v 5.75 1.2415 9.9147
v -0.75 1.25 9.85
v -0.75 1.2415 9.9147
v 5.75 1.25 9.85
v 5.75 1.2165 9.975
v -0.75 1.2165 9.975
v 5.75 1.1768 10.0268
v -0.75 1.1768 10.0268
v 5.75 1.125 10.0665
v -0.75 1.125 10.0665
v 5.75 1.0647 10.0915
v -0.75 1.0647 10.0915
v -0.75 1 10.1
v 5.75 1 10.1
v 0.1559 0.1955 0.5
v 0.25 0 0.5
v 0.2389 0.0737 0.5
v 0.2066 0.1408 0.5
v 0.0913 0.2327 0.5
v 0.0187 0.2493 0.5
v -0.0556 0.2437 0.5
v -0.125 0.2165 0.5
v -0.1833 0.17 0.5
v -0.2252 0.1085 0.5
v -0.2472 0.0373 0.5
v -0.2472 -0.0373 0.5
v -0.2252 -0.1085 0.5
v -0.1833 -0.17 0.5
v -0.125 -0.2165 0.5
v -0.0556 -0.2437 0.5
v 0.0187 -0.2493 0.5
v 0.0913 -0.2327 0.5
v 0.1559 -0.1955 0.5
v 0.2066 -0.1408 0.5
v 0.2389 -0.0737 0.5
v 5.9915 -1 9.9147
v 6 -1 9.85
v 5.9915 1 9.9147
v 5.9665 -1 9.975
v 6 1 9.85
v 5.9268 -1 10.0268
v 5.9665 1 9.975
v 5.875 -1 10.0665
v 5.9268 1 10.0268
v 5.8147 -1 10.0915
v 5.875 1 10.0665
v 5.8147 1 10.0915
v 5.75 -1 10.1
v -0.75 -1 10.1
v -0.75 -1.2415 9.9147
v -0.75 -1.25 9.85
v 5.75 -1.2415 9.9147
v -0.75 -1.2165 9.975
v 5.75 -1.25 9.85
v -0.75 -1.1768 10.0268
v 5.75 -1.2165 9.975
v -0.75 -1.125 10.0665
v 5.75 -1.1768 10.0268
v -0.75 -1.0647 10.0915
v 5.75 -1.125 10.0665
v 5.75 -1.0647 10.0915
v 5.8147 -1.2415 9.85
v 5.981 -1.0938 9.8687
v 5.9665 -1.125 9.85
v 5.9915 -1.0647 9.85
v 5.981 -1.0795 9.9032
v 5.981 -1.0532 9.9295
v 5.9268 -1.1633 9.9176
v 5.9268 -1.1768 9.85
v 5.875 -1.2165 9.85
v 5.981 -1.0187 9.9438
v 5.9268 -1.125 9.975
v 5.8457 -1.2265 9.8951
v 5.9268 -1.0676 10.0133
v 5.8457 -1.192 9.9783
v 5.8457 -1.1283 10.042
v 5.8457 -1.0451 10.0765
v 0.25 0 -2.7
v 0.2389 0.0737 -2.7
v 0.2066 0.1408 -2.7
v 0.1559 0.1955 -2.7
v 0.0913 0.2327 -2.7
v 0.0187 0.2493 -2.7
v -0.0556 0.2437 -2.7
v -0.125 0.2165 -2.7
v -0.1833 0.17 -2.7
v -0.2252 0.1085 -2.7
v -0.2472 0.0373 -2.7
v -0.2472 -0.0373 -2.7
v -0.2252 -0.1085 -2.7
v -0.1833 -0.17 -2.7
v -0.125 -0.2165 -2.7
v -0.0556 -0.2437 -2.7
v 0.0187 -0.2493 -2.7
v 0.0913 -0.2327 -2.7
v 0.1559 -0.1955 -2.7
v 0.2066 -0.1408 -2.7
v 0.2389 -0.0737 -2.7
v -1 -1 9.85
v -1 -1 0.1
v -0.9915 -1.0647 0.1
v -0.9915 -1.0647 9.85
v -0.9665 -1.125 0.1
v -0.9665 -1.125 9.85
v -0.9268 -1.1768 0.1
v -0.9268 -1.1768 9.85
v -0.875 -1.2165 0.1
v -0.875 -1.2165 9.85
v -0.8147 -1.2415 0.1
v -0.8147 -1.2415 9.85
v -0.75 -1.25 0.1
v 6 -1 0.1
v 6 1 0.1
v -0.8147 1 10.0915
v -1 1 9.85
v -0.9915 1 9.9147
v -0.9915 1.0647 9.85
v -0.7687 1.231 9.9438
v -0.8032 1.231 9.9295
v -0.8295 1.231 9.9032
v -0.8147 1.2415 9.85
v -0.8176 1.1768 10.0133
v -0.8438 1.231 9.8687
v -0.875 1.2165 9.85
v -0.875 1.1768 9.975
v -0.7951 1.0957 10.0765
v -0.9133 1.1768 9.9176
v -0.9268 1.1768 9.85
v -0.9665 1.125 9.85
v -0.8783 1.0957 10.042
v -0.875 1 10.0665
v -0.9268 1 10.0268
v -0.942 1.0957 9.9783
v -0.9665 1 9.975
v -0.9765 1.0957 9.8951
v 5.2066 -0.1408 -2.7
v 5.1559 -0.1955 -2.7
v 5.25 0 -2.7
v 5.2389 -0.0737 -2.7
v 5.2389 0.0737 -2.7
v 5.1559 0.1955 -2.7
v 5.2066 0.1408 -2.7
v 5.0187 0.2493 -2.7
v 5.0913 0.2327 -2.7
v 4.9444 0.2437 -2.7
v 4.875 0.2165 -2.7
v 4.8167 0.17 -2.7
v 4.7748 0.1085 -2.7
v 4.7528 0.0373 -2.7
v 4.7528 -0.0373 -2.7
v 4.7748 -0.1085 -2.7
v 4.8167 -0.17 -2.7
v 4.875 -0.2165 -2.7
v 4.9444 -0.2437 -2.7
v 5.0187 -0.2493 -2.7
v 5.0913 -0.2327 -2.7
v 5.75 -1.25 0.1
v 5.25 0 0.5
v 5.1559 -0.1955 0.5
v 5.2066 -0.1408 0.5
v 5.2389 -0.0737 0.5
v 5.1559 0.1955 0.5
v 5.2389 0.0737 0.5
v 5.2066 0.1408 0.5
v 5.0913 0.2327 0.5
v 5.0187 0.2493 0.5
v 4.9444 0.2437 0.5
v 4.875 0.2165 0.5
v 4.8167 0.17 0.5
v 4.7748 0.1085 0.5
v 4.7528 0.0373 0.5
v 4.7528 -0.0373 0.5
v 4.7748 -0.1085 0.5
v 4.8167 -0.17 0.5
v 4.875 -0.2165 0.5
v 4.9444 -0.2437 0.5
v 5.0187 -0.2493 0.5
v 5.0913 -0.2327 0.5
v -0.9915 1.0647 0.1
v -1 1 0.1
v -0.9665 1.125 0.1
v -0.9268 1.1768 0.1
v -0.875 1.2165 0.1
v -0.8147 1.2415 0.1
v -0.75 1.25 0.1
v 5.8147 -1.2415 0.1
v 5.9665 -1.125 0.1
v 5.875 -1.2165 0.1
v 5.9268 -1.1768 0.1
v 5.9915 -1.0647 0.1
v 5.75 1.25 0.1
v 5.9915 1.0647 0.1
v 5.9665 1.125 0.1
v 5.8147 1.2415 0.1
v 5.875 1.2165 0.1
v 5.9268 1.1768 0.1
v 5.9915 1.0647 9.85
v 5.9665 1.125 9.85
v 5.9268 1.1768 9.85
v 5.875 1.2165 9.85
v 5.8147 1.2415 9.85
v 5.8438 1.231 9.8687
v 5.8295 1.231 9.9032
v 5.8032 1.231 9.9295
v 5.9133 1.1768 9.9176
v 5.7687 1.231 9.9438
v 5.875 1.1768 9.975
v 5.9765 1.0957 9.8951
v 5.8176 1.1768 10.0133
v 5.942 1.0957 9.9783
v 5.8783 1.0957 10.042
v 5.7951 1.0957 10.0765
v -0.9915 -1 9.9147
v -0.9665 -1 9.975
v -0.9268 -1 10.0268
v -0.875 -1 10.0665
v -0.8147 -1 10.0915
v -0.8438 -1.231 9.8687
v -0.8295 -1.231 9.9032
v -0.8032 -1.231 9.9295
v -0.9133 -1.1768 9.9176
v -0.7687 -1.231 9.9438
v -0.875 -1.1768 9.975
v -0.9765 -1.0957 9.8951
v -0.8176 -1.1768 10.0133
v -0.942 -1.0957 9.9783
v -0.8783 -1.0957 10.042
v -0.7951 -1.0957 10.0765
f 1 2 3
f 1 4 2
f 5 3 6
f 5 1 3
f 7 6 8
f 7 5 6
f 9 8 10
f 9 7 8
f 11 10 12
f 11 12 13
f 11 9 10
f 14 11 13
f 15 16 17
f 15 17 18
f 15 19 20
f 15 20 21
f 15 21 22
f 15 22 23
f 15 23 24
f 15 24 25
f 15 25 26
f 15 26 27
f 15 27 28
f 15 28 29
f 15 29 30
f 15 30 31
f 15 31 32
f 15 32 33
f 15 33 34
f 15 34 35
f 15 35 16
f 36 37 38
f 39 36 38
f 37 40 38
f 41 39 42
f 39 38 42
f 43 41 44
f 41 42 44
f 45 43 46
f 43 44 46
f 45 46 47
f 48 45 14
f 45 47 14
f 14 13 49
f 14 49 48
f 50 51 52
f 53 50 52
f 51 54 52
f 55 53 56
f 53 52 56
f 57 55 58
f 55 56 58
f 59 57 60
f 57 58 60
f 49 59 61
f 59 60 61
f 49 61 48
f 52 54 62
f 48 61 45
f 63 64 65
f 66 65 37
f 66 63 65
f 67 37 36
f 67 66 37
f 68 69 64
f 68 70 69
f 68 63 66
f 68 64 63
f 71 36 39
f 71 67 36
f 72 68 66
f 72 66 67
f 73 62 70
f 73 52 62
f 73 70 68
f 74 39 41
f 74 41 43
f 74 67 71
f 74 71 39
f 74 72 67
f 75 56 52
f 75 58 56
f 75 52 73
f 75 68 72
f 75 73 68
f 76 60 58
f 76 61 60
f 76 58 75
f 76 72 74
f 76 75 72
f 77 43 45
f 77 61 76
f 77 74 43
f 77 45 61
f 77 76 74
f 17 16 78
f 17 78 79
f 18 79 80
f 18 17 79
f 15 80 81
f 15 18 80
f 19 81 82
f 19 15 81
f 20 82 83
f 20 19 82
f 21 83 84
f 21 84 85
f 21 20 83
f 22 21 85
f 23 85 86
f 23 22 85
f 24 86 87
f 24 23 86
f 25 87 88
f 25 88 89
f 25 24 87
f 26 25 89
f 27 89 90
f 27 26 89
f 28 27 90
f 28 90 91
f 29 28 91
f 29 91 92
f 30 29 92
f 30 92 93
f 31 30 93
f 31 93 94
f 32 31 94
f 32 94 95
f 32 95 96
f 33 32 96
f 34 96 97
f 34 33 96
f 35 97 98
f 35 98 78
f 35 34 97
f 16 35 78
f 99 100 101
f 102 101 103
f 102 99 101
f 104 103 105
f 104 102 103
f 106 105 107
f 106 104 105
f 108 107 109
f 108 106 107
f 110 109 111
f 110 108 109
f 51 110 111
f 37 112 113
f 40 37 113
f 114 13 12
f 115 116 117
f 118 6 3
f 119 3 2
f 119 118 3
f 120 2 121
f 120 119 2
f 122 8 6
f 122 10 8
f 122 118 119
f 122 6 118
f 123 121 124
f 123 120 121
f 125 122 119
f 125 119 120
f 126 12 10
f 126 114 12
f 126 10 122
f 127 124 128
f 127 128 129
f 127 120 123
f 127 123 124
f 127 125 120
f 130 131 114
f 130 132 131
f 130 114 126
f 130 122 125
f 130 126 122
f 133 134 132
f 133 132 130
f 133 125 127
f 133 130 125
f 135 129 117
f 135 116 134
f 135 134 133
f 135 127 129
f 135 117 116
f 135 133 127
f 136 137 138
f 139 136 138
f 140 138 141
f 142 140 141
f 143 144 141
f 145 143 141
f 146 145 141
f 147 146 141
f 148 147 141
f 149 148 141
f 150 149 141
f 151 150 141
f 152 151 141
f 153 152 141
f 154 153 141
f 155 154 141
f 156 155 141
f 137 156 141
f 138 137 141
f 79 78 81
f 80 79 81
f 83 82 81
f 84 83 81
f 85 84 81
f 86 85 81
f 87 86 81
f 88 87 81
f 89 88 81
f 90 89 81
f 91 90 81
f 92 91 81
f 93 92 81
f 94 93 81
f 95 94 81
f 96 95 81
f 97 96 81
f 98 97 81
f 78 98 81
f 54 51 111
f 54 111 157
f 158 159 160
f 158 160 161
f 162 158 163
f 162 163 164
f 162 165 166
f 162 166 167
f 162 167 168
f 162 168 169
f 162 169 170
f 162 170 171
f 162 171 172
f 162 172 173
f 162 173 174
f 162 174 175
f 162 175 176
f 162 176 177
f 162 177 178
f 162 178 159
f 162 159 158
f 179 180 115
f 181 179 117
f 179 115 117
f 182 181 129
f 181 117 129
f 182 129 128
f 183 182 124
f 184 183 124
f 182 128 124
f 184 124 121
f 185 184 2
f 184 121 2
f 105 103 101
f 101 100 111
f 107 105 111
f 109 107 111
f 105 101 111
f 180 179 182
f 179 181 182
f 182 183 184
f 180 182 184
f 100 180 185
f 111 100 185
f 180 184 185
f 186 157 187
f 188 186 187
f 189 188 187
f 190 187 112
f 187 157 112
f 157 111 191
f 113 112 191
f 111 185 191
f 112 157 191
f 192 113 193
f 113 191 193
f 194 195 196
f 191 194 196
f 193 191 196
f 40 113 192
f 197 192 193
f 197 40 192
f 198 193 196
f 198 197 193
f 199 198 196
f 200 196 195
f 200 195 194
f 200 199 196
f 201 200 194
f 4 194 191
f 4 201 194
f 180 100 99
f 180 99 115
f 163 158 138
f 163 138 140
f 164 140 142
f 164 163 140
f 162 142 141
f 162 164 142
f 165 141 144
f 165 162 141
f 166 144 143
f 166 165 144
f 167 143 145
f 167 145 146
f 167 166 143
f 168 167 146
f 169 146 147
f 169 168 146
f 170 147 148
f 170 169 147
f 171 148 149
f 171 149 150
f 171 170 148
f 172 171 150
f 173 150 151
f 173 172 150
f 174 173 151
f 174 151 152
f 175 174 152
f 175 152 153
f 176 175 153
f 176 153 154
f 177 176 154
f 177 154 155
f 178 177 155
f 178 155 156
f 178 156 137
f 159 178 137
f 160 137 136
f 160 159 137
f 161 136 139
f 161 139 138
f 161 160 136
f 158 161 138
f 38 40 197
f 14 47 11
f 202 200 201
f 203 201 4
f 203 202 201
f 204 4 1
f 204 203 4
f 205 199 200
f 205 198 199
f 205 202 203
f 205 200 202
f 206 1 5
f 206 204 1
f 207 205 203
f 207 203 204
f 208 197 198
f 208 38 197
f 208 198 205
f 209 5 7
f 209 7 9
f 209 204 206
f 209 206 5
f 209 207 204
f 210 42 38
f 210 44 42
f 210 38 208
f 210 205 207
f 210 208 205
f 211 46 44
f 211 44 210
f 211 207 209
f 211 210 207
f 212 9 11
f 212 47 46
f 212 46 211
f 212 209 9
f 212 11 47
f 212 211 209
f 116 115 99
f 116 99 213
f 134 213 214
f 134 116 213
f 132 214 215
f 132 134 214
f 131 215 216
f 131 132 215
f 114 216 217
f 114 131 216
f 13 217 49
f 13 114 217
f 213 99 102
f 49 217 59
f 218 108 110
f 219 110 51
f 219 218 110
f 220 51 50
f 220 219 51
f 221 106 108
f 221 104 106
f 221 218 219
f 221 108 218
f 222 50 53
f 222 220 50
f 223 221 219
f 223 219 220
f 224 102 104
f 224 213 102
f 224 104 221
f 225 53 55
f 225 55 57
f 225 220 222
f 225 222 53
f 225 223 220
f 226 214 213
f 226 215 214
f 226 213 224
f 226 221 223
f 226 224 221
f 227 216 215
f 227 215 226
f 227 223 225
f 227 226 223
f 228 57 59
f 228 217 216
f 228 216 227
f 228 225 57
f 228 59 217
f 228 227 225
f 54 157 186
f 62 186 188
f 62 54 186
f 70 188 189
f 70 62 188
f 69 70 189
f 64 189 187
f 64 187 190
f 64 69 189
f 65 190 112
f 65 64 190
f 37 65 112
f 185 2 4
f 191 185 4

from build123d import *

# Parameters (mm, degrees)
SKETCH_W     = 7
SKETCH_H     = 2.5
PAD_DEPTH    = 10
FILLET_R     = 0.25
SKETCH001_R  = 0.25
PAD001_DEPTH = 3.2


with BuildPart() as fillet_body:
    # Sketch → Pad (new body)
    with BuildSketch(Plane.XY.offset(0.1)):
        with Locations((2.5, 0)):
            Rectangle(SKETCH_W, SKETCH_H)
    extrude(amount=PAD_DEPTH)

    # Fillet
    fillet_edges = [fillet_body.edges().sort_by_distance(p)[0] for p in [
        (-1, 0, 10.1),
        (-1, -1.25, 5.1),
        (2.5, -1.25, 10.1),
        (6, -1.25, 5.1),
        (6, 0, 10.1),
        (6, 1.25, 5.1),
        (2.5, 1.25, 10.1),
        (-1, 1.25, 5.1),
    ]]
    fillet(fillet_edges, radius=FILLET_R)


with BuildPart() as pad001:
    # Sketch001 → Pad001 (new body)
    with BuildSketch(Plane.XY.offset(0.5)):
        Circle(SKETCH001_R)
        with Locations((5, 0)):
            Circle(SKETCH001_R)
    extrude(amount=-PAD001_DEPTH)


solid = Compound([fillet_body.part, pad001.part])
